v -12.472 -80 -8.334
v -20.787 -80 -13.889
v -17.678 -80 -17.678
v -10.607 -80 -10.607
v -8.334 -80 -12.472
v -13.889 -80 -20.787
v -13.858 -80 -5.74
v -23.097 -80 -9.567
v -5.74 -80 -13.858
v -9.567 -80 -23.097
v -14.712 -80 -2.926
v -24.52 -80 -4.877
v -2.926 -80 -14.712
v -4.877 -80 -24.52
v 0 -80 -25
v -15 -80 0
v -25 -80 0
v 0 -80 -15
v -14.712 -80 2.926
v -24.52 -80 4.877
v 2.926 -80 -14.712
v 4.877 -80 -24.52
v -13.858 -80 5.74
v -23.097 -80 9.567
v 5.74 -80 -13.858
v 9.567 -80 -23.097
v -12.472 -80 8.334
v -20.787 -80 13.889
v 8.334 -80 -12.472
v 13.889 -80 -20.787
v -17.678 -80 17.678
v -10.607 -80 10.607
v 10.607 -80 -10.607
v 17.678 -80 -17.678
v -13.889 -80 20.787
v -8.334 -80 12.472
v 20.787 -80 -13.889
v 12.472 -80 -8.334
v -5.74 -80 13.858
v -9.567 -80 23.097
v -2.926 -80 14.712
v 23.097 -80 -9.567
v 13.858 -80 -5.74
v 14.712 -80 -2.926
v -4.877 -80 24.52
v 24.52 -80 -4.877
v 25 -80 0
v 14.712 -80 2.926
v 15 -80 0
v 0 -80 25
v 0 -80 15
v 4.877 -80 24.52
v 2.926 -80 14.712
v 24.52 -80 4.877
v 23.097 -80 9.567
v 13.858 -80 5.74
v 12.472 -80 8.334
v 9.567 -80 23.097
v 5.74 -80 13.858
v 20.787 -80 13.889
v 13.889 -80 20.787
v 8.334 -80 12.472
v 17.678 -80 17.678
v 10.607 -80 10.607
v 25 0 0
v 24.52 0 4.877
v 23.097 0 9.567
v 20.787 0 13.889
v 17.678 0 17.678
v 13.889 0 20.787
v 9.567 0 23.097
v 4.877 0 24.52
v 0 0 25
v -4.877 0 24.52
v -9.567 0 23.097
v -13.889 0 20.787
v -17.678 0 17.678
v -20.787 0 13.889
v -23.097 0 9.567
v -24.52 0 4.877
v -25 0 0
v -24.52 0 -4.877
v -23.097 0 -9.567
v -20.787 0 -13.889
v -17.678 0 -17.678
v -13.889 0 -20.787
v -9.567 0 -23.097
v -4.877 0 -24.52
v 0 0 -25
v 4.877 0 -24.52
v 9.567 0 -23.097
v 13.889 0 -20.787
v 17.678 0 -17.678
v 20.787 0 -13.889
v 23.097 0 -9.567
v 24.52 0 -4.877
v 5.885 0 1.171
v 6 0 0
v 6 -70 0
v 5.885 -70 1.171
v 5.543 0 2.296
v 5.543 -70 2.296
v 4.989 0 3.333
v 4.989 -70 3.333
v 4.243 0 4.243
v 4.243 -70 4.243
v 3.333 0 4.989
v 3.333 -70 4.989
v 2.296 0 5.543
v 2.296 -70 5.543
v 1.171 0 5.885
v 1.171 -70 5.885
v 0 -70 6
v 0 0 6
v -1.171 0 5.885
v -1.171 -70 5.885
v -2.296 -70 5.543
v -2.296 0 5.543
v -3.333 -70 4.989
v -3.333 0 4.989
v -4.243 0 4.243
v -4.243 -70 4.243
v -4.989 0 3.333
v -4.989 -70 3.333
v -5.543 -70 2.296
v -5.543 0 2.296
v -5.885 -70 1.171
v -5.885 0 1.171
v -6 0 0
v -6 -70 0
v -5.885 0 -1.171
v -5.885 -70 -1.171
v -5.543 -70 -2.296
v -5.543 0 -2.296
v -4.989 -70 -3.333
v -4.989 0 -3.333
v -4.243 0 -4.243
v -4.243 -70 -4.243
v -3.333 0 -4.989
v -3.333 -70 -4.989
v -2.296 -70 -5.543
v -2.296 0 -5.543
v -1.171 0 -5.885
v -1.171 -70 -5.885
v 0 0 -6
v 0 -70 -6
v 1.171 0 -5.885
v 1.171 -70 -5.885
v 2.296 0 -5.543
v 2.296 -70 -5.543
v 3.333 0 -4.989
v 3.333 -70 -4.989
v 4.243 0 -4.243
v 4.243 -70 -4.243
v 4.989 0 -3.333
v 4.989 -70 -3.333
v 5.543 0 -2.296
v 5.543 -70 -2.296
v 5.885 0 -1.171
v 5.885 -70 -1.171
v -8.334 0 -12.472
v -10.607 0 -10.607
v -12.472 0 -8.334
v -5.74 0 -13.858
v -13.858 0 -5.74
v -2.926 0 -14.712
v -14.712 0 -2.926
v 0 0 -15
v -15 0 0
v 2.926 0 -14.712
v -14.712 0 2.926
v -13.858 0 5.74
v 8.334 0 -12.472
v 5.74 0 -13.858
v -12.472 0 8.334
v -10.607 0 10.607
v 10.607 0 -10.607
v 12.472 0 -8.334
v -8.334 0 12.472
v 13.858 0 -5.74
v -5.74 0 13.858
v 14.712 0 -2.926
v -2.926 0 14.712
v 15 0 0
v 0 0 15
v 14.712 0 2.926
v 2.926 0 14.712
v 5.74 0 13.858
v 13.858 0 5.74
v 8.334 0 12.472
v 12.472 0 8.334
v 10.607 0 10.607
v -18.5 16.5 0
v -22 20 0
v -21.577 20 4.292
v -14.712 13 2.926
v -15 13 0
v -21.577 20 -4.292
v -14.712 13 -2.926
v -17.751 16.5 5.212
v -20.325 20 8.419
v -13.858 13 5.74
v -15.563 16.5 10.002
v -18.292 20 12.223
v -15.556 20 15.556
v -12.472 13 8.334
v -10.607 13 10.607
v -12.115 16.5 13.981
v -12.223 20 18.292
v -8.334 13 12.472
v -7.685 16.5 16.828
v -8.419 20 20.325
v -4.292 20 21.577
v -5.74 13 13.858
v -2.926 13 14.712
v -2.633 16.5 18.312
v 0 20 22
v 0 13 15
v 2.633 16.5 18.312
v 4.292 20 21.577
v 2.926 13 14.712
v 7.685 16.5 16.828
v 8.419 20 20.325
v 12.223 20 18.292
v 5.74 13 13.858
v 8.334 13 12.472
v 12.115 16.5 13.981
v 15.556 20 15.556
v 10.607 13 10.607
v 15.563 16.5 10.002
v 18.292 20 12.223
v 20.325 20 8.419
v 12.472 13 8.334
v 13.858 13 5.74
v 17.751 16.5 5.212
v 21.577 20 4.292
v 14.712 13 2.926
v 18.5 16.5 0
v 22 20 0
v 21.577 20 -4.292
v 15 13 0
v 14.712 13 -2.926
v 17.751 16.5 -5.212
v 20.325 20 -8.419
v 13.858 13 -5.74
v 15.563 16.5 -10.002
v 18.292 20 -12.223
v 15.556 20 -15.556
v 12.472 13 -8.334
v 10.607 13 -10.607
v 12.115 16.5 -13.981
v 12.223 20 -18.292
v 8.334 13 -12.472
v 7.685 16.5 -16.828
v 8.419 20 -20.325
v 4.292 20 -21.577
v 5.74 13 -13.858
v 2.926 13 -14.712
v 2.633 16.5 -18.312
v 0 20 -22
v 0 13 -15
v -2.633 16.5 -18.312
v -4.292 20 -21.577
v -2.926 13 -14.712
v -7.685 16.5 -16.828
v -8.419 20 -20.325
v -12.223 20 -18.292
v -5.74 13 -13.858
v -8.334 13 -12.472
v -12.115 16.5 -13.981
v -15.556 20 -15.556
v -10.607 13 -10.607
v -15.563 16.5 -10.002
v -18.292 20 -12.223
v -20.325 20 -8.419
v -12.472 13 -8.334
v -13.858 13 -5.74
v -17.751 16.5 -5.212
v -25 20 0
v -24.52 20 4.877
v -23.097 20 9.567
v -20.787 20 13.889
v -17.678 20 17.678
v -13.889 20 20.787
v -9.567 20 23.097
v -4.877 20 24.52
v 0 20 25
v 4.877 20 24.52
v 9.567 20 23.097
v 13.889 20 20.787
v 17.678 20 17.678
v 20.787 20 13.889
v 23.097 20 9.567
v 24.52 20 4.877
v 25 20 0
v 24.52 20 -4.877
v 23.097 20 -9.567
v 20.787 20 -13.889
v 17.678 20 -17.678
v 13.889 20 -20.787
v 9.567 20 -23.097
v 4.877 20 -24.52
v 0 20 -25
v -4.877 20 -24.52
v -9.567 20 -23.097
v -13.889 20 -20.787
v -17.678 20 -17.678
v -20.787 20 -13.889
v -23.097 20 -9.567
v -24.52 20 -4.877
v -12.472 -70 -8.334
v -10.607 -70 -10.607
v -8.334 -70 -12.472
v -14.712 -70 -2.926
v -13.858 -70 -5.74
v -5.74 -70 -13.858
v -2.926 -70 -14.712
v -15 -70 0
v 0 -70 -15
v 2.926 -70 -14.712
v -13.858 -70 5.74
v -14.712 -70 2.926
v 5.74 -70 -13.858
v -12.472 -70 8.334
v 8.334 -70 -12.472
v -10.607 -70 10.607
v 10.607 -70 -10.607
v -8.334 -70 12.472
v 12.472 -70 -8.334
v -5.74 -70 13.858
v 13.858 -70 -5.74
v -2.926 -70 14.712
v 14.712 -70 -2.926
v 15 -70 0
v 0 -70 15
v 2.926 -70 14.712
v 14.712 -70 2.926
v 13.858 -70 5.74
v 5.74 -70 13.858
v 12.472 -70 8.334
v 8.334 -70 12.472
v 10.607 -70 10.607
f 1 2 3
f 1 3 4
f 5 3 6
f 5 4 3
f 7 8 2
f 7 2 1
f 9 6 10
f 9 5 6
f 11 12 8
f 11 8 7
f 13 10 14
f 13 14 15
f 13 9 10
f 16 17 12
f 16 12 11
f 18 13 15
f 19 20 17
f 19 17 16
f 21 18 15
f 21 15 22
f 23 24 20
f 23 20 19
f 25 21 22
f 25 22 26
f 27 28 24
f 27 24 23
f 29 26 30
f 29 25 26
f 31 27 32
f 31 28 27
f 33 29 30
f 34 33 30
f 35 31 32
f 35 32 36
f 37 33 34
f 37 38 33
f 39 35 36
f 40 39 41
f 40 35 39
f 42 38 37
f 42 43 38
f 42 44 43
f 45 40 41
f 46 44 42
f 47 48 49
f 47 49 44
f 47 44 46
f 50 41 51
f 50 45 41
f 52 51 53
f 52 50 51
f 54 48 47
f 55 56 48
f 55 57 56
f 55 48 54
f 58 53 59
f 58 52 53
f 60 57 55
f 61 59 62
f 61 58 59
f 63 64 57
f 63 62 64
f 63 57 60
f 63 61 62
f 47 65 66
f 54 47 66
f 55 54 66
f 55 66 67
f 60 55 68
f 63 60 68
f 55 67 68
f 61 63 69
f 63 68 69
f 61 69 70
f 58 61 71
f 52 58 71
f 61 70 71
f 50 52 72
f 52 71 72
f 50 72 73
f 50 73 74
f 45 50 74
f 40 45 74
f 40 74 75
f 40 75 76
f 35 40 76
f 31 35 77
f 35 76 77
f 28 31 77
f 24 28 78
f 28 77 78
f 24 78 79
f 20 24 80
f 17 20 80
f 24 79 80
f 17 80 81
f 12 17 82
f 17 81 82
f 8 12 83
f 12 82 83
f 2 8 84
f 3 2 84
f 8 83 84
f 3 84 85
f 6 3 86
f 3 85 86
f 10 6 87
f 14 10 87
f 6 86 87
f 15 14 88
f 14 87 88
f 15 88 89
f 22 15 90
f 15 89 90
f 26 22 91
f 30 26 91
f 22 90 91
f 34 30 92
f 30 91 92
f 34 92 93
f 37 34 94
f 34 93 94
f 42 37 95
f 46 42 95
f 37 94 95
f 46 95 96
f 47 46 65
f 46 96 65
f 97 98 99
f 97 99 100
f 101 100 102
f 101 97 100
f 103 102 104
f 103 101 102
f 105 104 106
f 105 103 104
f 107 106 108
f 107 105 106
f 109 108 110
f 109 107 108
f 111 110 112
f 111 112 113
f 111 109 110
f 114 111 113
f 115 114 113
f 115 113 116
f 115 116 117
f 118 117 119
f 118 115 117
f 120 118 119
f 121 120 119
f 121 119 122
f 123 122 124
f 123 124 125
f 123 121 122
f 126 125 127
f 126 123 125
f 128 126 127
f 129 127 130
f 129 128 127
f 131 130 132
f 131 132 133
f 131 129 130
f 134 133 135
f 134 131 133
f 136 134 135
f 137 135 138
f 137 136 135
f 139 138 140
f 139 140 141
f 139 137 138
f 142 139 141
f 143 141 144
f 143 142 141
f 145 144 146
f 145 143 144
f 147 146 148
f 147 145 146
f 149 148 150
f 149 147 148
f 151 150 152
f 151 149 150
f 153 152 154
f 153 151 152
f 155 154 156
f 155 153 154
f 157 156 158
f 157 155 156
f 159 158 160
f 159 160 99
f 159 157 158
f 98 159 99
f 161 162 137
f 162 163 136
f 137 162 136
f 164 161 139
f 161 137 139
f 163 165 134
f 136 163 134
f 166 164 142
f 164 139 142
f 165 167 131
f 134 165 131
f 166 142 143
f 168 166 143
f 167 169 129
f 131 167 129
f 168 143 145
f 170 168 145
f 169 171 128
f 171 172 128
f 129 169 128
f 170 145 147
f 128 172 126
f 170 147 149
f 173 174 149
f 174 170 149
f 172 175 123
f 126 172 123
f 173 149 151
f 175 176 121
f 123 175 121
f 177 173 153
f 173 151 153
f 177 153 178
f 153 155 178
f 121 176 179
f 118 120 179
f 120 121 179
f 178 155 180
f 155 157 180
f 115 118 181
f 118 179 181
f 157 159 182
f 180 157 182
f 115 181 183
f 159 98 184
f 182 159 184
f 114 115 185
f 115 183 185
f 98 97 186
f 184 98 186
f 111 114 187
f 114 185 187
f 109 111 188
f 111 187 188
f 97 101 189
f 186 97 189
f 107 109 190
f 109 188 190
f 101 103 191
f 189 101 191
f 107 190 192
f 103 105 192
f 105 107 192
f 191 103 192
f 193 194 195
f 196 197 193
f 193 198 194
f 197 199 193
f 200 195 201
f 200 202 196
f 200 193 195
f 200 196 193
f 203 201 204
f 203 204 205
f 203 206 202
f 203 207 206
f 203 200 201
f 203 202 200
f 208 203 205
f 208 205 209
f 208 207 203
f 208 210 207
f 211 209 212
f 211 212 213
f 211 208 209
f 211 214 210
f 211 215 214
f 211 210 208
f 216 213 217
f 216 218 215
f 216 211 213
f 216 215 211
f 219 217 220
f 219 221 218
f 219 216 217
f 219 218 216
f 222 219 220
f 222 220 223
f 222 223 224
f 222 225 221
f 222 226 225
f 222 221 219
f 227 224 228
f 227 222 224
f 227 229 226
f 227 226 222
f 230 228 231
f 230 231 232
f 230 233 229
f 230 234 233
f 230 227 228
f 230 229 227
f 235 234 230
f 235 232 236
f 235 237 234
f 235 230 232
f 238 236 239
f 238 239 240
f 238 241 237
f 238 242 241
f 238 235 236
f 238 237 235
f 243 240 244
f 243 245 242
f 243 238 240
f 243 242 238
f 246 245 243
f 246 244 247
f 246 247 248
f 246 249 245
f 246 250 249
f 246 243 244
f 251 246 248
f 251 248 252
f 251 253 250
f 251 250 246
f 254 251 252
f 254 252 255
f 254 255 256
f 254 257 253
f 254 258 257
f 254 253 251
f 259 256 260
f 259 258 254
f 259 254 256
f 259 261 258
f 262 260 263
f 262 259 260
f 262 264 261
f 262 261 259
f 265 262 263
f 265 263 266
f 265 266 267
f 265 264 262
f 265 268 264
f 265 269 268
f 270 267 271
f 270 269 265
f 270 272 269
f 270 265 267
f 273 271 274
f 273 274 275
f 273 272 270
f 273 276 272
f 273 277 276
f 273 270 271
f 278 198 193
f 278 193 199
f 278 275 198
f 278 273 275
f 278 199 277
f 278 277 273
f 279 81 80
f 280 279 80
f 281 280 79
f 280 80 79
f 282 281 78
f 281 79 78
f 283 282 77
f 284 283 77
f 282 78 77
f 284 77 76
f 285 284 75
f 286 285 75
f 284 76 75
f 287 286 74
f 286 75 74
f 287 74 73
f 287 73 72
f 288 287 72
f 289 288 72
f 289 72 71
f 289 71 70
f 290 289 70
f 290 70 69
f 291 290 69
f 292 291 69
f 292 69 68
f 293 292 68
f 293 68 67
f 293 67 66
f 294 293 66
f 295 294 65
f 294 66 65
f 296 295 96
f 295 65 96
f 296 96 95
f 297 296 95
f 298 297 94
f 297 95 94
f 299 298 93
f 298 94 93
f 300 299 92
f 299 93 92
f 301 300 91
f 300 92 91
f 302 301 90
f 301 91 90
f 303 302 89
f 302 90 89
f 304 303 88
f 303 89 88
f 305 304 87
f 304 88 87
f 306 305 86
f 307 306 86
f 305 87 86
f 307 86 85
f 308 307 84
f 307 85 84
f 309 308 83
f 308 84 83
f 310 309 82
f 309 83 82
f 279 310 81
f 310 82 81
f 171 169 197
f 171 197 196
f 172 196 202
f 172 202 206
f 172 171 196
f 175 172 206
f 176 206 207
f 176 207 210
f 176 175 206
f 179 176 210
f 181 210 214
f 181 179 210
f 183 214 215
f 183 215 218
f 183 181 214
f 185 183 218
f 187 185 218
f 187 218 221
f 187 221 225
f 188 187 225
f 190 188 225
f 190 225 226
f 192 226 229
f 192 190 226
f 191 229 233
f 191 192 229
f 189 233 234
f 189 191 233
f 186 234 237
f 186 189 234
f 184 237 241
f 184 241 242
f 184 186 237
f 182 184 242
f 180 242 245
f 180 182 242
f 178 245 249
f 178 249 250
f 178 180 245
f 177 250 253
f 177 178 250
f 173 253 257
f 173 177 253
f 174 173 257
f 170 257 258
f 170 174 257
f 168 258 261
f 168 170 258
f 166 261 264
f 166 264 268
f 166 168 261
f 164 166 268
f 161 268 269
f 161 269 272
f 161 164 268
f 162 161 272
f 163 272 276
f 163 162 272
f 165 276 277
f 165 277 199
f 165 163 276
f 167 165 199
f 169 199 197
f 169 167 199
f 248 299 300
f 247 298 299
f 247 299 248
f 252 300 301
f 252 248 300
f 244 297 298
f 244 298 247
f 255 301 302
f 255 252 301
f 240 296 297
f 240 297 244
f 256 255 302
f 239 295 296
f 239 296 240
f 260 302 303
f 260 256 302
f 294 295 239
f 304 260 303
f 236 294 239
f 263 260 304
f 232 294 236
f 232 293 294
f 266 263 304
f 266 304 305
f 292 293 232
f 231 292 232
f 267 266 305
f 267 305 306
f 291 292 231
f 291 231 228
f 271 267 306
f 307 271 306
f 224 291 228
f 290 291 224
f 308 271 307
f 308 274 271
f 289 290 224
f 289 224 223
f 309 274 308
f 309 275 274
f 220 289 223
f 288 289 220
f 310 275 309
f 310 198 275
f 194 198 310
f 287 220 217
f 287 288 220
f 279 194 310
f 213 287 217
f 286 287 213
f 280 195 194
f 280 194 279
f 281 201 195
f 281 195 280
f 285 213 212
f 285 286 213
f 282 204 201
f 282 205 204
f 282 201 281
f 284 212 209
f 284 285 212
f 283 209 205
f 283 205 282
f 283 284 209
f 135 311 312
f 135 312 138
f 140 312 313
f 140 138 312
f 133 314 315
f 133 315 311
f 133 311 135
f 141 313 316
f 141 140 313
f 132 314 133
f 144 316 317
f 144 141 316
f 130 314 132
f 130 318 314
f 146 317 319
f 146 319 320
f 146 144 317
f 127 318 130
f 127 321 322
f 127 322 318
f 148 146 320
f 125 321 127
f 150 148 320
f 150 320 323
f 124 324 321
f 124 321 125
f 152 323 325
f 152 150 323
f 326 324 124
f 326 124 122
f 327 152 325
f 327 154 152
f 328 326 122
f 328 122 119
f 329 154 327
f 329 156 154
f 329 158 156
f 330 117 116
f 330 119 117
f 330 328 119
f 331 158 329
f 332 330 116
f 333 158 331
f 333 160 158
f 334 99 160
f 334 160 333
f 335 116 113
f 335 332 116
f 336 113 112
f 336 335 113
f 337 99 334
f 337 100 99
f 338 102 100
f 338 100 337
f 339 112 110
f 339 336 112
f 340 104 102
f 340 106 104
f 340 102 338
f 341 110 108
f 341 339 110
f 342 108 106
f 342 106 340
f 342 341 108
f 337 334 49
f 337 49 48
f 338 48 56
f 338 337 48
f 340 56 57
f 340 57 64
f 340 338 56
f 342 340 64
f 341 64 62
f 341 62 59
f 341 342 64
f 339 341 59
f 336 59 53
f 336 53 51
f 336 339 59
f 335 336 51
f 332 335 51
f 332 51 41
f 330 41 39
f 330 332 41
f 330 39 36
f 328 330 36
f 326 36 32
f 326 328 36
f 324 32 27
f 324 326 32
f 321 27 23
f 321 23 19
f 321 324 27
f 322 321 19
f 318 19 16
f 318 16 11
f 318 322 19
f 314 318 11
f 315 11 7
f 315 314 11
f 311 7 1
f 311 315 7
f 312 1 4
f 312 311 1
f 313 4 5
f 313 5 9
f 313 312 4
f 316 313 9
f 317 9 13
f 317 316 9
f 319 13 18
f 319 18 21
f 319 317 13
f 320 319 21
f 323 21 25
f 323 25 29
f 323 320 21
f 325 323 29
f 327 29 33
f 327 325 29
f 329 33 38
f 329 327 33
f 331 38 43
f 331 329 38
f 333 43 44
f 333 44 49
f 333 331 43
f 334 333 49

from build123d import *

# Parameters (mm, degrees)
F0_R     = 25
F0_R_2   = 6
F1_DEPTH = 70
F2_R     = 25
F2_R_2   = 15
F3_DEPTH = 10
F4_R     = 25
F4_R_2   = 15
F5_DEPTH = 20
F6_SIZE  = 7


with BuildPart() as f1:
    # F0 (on Front) → F1 (new body)
    with BuildSketch(Plane.XZ):
        Circle(F0_R)
        Circle(F0_R_2, mode=Mode.SUBTRACT)
    extrude(amount=F1_DEPTH)

    # F2 (on face) → F3 (join)
    with BuildSketch(Plane.XZ.offset(70)):
        Circle(F2_R)
        Circle(F2_R_2, mode=Mode.SUBTRACT)
    extrude(amount=F3_DEPTH)

    # F4 (on face) → F5 (join)
    with BuildSketch(Plane(origin=(0, 0, 0), x_dir=(-1, 0, 0), z_dir=(0, 1, 0))):
        Circle(F4_R)
        Circle(F4_R_2, mode=Mode.SUBTRACT)
    extrude(amount=F5_DEPTH)

    # F6
    f6_edges = [f1.edges().sort_by_distance(p)[0] for p in [
        (15, 20, 0),
    ]]
    chamfer(f6_edges, length=F6_SIZE)


solid = f1.part
